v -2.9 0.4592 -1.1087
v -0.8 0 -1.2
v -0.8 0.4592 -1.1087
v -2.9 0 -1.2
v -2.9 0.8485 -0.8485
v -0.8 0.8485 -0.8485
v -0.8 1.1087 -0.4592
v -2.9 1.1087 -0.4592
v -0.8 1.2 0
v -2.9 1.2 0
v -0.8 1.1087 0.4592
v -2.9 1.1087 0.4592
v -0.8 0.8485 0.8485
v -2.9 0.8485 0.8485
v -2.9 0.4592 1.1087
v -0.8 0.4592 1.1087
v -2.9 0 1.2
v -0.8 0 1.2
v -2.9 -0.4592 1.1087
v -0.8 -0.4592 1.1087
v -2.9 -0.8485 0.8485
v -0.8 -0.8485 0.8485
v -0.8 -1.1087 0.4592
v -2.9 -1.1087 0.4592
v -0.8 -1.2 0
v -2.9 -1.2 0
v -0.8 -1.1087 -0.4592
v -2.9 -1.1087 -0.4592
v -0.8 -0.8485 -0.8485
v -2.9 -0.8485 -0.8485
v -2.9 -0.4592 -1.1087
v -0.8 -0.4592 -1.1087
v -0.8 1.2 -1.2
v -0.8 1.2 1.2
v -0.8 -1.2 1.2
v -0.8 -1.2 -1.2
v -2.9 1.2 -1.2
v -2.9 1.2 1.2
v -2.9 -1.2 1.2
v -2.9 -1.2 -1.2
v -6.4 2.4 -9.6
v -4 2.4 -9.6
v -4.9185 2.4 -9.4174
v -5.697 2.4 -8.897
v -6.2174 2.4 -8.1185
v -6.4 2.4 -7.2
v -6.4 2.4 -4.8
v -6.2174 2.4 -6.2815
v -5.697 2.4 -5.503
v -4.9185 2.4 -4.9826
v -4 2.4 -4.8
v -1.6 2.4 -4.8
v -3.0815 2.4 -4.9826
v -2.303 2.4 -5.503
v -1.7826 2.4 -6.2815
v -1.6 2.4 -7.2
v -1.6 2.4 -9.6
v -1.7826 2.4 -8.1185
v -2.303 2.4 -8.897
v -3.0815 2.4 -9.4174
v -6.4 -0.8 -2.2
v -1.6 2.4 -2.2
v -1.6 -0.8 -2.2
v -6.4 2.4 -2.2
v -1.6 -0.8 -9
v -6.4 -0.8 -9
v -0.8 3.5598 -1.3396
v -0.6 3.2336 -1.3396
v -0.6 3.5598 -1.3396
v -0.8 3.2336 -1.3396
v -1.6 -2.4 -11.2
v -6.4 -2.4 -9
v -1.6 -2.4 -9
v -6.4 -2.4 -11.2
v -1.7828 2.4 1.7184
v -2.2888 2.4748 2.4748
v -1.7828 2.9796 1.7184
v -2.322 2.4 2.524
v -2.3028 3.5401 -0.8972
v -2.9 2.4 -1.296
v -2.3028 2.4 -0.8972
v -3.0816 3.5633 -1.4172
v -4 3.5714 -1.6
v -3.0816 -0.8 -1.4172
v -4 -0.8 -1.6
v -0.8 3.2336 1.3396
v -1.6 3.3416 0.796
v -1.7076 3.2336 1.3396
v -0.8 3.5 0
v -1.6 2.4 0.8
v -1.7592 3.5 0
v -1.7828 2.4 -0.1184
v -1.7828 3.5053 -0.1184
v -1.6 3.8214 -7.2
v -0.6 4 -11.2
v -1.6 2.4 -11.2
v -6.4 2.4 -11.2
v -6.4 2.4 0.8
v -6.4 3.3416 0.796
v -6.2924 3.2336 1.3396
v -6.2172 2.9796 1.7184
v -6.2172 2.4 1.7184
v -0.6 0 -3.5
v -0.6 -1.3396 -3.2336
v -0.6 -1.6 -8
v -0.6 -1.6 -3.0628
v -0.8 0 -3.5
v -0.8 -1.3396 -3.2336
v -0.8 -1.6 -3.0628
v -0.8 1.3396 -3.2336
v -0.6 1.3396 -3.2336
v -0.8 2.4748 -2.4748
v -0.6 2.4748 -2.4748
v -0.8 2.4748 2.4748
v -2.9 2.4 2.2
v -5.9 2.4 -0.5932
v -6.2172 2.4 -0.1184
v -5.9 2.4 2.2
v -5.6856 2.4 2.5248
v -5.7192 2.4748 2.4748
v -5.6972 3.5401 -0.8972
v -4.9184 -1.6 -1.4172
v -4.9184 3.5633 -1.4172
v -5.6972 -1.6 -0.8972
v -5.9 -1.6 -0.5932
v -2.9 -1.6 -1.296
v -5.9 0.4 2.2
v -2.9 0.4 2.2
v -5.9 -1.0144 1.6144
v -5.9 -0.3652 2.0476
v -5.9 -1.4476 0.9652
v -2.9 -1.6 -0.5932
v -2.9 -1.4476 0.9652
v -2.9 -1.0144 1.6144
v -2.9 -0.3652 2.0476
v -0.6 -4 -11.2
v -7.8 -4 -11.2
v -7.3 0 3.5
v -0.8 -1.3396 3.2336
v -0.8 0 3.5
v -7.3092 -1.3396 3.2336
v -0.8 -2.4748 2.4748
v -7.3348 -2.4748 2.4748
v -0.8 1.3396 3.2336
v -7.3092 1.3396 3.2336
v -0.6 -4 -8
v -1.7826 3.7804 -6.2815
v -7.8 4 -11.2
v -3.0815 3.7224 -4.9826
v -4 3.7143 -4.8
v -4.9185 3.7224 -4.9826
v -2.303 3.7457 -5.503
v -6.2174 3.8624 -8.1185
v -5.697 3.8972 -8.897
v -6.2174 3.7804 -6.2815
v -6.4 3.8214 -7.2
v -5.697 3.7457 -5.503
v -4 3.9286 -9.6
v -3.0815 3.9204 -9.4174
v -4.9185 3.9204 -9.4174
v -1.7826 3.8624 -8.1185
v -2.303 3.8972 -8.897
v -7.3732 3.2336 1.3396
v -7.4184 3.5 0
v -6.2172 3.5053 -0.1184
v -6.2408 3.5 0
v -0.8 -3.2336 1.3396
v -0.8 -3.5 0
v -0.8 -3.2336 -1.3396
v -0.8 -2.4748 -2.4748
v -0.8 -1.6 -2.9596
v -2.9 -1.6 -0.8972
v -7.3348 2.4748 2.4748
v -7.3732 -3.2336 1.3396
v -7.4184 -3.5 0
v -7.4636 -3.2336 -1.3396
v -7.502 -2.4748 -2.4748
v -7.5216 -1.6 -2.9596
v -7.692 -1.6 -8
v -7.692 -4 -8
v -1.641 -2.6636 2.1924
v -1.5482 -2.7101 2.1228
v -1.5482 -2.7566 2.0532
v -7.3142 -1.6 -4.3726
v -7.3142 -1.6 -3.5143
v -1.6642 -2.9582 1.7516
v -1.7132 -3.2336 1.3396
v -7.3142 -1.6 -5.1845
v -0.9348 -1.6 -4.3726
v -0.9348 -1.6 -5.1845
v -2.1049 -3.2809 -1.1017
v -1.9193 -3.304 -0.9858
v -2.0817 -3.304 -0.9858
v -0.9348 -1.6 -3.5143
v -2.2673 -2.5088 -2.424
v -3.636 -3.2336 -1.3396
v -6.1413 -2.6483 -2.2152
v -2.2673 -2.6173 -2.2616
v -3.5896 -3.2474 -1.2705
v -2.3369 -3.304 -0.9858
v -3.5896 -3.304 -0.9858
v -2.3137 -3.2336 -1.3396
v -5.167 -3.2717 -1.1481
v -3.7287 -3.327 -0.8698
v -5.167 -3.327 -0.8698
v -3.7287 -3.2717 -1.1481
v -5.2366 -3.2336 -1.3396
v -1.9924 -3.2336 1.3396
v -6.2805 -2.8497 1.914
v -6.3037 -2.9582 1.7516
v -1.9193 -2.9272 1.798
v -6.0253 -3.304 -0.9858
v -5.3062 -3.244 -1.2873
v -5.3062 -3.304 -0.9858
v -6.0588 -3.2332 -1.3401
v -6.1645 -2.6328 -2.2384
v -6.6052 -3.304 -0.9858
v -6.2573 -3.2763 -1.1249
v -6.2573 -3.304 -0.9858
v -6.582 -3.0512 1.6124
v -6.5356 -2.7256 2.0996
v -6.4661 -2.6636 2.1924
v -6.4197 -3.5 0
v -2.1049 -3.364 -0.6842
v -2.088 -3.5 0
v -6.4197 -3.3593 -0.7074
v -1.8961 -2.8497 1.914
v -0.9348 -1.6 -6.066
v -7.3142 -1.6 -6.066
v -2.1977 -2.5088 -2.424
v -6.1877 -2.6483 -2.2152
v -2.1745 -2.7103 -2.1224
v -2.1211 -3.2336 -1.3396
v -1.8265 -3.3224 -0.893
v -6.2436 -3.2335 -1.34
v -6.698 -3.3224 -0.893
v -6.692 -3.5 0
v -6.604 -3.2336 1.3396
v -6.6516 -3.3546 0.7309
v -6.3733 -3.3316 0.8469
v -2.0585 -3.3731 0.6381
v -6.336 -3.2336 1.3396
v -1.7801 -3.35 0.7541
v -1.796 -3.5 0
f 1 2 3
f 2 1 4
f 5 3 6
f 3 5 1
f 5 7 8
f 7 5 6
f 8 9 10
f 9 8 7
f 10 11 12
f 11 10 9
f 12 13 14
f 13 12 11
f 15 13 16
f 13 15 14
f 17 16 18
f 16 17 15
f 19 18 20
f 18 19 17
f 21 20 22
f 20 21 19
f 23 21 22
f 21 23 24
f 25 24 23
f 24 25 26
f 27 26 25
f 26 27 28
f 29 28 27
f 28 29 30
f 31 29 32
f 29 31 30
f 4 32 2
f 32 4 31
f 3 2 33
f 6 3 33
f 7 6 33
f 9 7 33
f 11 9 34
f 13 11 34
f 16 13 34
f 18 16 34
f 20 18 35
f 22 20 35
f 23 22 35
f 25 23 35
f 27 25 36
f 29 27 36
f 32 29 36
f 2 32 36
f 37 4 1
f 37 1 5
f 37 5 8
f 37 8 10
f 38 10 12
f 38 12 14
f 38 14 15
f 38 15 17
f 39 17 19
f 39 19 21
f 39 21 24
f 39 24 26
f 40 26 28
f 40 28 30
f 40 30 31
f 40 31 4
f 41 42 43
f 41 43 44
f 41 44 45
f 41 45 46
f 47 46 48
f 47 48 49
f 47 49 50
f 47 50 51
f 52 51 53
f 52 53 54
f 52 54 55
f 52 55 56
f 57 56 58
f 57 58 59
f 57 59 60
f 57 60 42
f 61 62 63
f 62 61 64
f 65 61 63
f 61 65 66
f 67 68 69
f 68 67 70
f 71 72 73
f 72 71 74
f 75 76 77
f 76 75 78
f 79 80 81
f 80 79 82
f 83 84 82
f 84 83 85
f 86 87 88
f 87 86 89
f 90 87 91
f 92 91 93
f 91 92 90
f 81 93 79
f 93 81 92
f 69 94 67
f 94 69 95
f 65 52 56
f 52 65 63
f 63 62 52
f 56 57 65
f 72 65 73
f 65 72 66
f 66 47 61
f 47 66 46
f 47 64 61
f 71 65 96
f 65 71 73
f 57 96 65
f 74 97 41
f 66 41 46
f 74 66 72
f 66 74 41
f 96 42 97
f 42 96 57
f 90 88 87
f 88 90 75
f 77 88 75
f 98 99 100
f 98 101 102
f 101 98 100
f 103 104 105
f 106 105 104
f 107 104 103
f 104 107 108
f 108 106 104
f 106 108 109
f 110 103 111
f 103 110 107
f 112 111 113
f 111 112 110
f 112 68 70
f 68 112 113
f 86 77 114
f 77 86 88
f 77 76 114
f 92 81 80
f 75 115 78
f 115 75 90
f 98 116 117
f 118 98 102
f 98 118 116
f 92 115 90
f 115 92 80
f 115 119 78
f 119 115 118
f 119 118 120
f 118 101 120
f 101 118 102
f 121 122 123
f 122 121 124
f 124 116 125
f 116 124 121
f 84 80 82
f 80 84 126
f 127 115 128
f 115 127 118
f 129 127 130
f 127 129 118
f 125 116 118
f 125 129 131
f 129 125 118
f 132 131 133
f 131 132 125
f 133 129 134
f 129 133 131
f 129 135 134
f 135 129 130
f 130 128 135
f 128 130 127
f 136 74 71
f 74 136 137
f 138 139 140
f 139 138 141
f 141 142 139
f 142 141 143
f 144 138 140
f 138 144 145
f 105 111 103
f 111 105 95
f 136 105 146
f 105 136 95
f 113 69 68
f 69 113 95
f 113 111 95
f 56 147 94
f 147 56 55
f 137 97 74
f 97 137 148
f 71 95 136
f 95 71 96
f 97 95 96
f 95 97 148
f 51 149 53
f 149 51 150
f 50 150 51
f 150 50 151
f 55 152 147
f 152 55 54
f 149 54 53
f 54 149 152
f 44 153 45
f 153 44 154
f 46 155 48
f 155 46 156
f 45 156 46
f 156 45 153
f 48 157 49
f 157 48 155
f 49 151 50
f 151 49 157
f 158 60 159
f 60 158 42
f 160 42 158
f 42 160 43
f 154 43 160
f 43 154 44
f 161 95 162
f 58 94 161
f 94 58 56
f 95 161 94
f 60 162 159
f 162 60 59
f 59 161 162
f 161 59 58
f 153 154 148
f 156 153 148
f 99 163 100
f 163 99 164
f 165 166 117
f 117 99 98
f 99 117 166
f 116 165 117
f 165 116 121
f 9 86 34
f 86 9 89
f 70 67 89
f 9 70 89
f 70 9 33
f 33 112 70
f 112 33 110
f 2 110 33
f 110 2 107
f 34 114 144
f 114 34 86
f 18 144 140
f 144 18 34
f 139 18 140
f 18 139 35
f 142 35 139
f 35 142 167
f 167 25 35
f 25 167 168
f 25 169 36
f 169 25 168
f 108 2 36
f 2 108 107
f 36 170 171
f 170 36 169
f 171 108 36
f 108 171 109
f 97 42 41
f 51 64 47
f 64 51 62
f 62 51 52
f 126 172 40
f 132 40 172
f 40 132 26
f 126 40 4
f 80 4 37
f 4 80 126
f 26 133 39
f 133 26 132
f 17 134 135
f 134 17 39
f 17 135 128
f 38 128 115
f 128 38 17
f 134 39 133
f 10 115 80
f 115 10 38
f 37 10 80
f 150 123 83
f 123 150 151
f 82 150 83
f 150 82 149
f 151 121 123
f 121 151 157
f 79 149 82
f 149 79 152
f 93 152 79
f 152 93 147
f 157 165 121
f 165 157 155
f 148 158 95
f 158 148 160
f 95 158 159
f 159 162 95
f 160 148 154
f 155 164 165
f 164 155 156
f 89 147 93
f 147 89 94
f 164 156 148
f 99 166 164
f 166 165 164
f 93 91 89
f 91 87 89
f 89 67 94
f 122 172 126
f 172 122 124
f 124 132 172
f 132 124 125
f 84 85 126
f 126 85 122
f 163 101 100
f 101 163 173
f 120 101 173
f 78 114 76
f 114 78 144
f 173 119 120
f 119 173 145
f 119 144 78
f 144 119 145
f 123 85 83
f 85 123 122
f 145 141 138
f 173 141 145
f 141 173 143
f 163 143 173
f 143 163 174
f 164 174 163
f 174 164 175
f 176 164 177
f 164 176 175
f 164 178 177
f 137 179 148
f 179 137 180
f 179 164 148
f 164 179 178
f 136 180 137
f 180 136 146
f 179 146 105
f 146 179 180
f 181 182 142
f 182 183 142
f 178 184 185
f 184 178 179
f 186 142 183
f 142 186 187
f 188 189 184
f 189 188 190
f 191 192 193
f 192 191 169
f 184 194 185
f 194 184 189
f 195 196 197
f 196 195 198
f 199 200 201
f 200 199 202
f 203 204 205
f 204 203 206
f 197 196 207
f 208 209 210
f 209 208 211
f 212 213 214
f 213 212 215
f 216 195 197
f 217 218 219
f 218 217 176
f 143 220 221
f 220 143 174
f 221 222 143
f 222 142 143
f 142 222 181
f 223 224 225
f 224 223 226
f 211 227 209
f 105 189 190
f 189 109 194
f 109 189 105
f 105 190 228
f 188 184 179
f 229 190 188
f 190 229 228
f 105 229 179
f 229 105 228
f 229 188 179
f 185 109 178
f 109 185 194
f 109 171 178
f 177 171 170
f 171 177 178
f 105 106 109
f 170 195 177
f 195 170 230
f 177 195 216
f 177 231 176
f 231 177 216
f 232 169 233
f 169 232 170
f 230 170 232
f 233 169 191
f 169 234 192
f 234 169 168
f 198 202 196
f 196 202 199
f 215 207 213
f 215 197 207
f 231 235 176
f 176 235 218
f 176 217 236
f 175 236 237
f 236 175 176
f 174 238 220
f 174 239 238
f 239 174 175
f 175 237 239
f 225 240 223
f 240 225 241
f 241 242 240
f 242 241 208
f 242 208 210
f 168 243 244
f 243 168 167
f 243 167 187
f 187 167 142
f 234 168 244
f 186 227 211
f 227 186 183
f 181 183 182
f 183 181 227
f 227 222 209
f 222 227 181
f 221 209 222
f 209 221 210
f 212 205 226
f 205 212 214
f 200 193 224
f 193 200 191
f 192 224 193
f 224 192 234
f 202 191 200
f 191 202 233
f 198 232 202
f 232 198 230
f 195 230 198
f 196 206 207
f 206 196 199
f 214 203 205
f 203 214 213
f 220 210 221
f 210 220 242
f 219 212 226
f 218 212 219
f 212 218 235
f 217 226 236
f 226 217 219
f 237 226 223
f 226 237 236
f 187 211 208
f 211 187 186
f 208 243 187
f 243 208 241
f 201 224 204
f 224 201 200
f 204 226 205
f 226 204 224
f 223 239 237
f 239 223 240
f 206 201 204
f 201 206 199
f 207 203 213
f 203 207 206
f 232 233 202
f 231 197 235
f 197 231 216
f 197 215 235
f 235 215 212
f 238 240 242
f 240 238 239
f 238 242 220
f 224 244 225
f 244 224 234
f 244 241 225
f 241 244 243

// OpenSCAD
use <../lib.scad>
use <3817bp70.scad>
function ldraw_lib__3816bp70() = [
// 0 Minifig Leg Right with Reflective Stripes and Black Pocket Outline Pattern
// 0 Name: 3816bp70.dat
// 0 Author: Philippe Hurbain [Philo]
// 0 !LDRAW_ORG Part UPDATE 2020-01
// 0 !LICENSE Licensed under CC BY 2.0 and CC BY 4.0 : see CAreadme.txt
// 
// 0 BFC CERTIFY CCW
  [0,"BFC","CERTIFY"],
  [0,"BFC","CCW"],
// 
// 0 !KEYWORDS Bricklink 970c00pb0901
// 
// 0 !HISTORY 2020-06-28 [PTadmin] Official Update 2020-01
// 
// 
// 1 16 0 0 0 -1 0 0 0 1 0 0 0 1 3817bp70.dat
  [1,16,0,0,0,-1,0,0,0,1,0,0,0,1, ldraw_lib__3817bp70()],
];
makepoly(ldraw_lib__3816bp70(), line=0.2);
